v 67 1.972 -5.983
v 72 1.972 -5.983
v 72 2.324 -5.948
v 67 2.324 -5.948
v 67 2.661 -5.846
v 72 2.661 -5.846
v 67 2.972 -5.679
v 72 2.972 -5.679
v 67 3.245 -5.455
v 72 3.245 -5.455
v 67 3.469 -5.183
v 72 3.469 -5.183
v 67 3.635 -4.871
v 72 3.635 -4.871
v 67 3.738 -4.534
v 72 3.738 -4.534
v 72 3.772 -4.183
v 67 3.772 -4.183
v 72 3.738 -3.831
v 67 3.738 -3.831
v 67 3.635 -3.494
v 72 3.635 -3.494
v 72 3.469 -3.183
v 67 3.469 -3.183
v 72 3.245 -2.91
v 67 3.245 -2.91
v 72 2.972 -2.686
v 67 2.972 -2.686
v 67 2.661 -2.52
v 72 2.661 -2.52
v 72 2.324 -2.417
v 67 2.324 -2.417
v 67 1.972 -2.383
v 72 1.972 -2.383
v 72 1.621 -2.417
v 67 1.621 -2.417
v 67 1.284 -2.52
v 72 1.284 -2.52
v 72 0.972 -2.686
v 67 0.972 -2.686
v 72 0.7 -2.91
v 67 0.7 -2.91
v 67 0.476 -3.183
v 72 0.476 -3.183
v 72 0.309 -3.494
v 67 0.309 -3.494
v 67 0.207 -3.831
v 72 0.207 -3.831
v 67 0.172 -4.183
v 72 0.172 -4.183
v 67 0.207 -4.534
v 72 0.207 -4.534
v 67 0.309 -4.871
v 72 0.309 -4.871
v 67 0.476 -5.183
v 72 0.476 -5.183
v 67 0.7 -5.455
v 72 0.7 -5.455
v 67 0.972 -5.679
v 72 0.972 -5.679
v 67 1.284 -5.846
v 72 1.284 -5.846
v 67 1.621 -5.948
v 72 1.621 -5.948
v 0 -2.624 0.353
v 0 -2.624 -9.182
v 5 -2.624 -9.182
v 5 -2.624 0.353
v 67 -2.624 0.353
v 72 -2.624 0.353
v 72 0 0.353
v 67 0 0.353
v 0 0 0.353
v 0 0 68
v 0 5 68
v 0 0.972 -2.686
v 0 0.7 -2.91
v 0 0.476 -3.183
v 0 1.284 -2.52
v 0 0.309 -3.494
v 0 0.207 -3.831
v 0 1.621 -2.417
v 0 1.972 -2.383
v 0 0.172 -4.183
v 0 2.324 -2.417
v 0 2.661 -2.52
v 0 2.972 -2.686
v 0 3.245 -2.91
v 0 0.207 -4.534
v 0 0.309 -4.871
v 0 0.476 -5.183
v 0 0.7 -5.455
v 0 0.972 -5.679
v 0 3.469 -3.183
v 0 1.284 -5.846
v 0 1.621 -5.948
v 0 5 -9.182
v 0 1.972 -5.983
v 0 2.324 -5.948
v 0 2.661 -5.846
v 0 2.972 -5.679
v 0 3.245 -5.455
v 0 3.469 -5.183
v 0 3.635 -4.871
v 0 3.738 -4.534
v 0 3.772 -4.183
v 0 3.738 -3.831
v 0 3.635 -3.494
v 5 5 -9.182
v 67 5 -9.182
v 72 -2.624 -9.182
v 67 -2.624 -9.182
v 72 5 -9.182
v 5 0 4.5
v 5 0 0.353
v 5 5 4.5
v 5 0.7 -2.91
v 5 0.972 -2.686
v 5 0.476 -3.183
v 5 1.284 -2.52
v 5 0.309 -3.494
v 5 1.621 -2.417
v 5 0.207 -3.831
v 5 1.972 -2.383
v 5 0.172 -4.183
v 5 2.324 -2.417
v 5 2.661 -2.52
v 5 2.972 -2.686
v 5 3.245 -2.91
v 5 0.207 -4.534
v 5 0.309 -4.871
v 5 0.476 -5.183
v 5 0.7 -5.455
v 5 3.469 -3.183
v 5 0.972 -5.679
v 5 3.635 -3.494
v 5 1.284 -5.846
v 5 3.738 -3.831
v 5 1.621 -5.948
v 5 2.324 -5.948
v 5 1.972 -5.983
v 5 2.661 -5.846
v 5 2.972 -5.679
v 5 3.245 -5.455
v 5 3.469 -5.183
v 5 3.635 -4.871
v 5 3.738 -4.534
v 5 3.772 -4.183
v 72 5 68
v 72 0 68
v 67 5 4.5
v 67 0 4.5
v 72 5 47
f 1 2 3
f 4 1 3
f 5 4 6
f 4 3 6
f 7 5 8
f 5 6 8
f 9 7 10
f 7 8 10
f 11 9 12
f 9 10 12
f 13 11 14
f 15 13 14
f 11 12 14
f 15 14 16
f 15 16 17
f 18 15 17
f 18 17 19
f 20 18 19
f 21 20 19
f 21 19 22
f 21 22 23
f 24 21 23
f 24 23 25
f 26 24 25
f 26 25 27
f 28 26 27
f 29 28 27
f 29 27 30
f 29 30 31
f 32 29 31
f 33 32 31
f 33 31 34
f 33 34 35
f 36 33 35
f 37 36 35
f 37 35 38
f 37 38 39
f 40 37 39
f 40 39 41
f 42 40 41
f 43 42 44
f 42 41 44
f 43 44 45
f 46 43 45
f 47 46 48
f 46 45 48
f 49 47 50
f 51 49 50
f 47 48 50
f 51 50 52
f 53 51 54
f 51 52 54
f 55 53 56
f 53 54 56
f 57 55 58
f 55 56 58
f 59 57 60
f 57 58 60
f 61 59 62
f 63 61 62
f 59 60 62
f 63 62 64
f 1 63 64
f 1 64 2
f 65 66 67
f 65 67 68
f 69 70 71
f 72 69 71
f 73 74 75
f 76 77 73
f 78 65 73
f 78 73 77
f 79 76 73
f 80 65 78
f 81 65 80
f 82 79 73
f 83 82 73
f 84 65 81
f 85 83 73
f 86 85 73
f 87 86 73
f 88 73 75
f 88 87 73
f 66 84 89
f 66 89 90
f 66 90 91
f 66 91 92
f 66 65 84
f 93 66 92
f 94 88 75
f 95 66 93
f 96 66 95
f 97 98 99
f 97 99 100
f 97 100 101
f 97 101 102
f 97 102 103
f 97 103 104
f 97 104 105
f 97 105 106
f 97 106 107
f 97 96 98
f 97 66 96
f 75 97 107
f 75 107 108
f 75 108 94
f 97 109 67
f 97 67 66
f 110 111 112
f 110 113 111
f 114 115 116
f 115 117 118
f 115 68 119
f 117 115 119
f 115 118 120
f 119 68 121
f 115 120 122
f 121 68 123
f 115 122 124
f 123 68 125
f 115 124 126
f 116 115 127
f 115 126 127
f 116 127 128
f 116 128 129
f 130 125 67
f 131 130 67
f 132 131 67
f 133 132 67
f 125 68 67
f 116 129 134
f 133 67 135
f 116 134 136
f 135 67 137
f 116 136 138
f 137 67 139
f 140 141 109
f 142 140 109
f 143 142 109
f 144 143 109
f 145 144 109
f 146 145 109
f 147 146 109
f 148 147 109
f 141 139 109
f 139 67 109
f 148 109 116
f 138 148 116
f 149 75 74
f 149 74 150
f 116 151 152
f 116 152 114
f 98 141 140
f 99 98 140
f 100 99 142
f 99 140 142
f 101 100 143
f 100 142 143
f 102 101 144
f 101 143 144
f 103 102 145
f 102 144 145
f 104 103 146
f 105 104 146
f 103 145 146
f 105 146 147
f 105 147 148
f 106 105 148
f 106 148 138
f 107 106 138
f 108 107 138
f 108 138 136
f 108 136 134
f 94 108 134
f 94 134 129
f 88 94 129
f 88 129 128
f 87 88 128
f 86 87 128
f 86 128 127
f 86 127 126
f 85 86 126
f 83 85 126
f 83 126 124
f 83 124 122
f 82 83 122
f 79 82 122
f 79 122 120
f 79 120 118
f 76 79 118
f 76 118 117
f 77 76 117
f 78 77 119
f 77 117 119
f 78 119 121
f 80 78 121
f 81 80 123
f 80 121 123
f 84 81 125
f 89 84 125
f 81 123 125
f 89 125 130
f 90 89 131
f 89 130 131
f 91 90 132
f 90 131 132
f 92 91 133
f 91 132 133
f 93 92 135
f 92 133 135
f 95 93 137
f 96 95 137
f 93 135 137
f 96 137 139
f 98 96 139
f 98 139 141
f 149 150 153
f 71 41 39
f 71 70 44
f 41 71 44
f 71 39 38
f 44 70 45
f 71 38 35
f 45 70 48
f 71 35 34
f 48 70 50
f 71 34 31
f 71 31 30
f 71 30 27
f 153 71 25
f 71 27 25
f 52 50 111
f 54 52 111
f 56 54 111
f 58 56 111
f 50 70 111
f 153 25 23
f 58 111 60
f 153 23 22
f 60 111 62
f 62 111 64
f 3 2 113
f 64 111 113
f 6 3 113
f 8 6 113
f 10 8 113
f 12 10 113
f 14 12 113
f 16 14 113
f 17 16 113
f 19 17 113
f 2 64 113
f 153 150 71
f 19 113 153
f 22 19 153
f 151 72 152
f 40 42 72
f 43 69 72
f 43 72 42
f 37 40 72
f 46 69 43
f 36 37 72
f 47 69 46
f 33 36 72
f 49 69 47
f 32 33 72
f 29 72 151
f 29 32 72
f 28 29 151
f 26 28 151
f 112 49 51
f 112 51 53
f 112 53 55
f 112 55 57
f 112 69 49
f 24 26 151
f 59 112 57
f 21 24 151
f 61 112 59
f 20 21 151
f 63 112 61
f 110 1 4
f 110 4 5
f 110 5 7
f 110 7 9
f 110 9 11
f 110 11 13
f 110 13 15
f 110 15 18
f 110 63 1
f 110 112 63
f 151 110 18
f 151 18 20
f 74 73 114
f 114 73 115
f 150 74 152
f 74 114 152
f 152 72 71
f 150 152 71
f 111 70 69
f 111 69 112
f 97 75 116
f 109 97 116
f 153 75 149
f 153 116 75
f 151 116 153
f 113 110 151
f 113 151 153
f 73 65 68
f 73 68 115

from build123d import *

# Parameters (mm, degrees)
SKETCH1_W           = 72
SKETCH1_H           = 47
SKETCH1_W_2         = 5
SKETCH1_H_2         = 13.68224698
SKETCH1_H_3         = 13
BOSS_EXTRUDE1_DEPTH = 5
SKETCH3_W           = 14.035397612
SKETCH3_H           = 7.623801165
BOSS_EXTRUDE3_DEPTH = 5
SKETCH5_W           = 14.035397612
SKETCH5_H           = 7.623801165
BOSS_EXTRUDE4_DEPTH = 5
SKETCH4_R           = 1.799999998
CUT_EXTRUDE1_DEPTH  = 95
SKETCH6_W           = 72
SKETCH6_H           = 5
BOSS_EXTRUDE5_DEPTH = 21
SKETCH8_W           = 114.485355007
SKETCH8_H           = 45.141194617
CUT_EXTRUDE2_DEPTH  = 4.5
SKETCH9_W           = 62
SKETCH9_H           = 5
CUT_EXTRUDE3_DEPTH  = 4.5


with BuildPart() as part:
    # Sketch1 → Boss-Extrude1 (new body)
    with BuildSketch(Plane(origin=(0, 0, 0), x_dir=(1, 0, 0), z_dir=(0, 1, 0))):
        with Locations((36, -23.5)):
            Rectangle(SKETCH1_W, SKETCH1_H)
        with Locations((69.5, 6.84112349)):
            Rectangle(SKETCH1_W_2, SKETCH1_H_2)
        with Locations((2.5, 6.5)):
            Rectangle(SKETCH1_W_2, SKETCH1_H_3)
    extrude(amount=BOSS_EXTRUDE1_DEPTH)

    # Sketch3 → Boss-Extrude3 (add)
    with BuildSketch(Plane(origin=(72, 0, 0), x_dir=(0, 0, -1), z_dir=(1, 0, 0))):
        with Locations((6.664548174, 1.188099417)):
            Rectangle(SKETCH3_W, SKETCH3_H)
    extrude(amount=-BOSS_EXTRUDE3_DEPTH)

    # Sketch5 → Boss-Extrude4 (add)
    with BuildSketch(Plane.ZY):
        with Locations((-6.664548174, 1.188099417)):
            Rectangle(SKETCH5_W, SKETCH5_H)
    extrude(amount=-BOSS_EXTRUDE4_DEPTH)

    # Sketch4 → Cut-Extrude1 (cut)
    with BuildSketch(Plane(origin=(72, 0, 0), x_dir=(0, 0, -1), z_dir=(1, 0, 0))):
        with Locations((4.182640247, 1.972422216)):
            Circle(SKETCH4_R)
    extrude(amount=-CUT_EXTRUDE1_DEPTH, mode=Mode.SUBTRACT)

    # Sketch6 → Boss-Extrude5 (add)
    with BuildSketch(Plane.XY.offset(47)):
        with Locations((36, 2.5)):
            Rectangle(SKETCH6_W, SKETCH6_H)
    extrude(amount=BOSS_EXTRUDE5_DEPTH)

    # Sketch8 → Cut-Extrude2 (cut)
    with BuildSketch(Plane(origin=(0, 0, -13.68224698), x_dir=(-1, 0, 0), z_dir=(0, 0, -1))):
        with Locations((-40.6465034, -1.597733879)):
            Rectangle(SKETCH8_W, SKETCH8_H)
    extrude(amount=-CUT_EXTRUDE2_DEPTH, mode=Mode.SUBTRACT)

    # Sketch9 → Cut-Extrude3 (cut)
    with BuildSketch(Plane(origin=(0, 0, 0), x_dir=(-1, 0, 0), z_dir=(0, 0, -1))):
        with Locations((-36, 2.5)):
            Rectangle(SKETCH9_W, SKETCH9_H)
    extrude(amount=-CUT_EXTRUDE3_DEPTH, mode=Mode.SUBTRACT)


solid = part.part
